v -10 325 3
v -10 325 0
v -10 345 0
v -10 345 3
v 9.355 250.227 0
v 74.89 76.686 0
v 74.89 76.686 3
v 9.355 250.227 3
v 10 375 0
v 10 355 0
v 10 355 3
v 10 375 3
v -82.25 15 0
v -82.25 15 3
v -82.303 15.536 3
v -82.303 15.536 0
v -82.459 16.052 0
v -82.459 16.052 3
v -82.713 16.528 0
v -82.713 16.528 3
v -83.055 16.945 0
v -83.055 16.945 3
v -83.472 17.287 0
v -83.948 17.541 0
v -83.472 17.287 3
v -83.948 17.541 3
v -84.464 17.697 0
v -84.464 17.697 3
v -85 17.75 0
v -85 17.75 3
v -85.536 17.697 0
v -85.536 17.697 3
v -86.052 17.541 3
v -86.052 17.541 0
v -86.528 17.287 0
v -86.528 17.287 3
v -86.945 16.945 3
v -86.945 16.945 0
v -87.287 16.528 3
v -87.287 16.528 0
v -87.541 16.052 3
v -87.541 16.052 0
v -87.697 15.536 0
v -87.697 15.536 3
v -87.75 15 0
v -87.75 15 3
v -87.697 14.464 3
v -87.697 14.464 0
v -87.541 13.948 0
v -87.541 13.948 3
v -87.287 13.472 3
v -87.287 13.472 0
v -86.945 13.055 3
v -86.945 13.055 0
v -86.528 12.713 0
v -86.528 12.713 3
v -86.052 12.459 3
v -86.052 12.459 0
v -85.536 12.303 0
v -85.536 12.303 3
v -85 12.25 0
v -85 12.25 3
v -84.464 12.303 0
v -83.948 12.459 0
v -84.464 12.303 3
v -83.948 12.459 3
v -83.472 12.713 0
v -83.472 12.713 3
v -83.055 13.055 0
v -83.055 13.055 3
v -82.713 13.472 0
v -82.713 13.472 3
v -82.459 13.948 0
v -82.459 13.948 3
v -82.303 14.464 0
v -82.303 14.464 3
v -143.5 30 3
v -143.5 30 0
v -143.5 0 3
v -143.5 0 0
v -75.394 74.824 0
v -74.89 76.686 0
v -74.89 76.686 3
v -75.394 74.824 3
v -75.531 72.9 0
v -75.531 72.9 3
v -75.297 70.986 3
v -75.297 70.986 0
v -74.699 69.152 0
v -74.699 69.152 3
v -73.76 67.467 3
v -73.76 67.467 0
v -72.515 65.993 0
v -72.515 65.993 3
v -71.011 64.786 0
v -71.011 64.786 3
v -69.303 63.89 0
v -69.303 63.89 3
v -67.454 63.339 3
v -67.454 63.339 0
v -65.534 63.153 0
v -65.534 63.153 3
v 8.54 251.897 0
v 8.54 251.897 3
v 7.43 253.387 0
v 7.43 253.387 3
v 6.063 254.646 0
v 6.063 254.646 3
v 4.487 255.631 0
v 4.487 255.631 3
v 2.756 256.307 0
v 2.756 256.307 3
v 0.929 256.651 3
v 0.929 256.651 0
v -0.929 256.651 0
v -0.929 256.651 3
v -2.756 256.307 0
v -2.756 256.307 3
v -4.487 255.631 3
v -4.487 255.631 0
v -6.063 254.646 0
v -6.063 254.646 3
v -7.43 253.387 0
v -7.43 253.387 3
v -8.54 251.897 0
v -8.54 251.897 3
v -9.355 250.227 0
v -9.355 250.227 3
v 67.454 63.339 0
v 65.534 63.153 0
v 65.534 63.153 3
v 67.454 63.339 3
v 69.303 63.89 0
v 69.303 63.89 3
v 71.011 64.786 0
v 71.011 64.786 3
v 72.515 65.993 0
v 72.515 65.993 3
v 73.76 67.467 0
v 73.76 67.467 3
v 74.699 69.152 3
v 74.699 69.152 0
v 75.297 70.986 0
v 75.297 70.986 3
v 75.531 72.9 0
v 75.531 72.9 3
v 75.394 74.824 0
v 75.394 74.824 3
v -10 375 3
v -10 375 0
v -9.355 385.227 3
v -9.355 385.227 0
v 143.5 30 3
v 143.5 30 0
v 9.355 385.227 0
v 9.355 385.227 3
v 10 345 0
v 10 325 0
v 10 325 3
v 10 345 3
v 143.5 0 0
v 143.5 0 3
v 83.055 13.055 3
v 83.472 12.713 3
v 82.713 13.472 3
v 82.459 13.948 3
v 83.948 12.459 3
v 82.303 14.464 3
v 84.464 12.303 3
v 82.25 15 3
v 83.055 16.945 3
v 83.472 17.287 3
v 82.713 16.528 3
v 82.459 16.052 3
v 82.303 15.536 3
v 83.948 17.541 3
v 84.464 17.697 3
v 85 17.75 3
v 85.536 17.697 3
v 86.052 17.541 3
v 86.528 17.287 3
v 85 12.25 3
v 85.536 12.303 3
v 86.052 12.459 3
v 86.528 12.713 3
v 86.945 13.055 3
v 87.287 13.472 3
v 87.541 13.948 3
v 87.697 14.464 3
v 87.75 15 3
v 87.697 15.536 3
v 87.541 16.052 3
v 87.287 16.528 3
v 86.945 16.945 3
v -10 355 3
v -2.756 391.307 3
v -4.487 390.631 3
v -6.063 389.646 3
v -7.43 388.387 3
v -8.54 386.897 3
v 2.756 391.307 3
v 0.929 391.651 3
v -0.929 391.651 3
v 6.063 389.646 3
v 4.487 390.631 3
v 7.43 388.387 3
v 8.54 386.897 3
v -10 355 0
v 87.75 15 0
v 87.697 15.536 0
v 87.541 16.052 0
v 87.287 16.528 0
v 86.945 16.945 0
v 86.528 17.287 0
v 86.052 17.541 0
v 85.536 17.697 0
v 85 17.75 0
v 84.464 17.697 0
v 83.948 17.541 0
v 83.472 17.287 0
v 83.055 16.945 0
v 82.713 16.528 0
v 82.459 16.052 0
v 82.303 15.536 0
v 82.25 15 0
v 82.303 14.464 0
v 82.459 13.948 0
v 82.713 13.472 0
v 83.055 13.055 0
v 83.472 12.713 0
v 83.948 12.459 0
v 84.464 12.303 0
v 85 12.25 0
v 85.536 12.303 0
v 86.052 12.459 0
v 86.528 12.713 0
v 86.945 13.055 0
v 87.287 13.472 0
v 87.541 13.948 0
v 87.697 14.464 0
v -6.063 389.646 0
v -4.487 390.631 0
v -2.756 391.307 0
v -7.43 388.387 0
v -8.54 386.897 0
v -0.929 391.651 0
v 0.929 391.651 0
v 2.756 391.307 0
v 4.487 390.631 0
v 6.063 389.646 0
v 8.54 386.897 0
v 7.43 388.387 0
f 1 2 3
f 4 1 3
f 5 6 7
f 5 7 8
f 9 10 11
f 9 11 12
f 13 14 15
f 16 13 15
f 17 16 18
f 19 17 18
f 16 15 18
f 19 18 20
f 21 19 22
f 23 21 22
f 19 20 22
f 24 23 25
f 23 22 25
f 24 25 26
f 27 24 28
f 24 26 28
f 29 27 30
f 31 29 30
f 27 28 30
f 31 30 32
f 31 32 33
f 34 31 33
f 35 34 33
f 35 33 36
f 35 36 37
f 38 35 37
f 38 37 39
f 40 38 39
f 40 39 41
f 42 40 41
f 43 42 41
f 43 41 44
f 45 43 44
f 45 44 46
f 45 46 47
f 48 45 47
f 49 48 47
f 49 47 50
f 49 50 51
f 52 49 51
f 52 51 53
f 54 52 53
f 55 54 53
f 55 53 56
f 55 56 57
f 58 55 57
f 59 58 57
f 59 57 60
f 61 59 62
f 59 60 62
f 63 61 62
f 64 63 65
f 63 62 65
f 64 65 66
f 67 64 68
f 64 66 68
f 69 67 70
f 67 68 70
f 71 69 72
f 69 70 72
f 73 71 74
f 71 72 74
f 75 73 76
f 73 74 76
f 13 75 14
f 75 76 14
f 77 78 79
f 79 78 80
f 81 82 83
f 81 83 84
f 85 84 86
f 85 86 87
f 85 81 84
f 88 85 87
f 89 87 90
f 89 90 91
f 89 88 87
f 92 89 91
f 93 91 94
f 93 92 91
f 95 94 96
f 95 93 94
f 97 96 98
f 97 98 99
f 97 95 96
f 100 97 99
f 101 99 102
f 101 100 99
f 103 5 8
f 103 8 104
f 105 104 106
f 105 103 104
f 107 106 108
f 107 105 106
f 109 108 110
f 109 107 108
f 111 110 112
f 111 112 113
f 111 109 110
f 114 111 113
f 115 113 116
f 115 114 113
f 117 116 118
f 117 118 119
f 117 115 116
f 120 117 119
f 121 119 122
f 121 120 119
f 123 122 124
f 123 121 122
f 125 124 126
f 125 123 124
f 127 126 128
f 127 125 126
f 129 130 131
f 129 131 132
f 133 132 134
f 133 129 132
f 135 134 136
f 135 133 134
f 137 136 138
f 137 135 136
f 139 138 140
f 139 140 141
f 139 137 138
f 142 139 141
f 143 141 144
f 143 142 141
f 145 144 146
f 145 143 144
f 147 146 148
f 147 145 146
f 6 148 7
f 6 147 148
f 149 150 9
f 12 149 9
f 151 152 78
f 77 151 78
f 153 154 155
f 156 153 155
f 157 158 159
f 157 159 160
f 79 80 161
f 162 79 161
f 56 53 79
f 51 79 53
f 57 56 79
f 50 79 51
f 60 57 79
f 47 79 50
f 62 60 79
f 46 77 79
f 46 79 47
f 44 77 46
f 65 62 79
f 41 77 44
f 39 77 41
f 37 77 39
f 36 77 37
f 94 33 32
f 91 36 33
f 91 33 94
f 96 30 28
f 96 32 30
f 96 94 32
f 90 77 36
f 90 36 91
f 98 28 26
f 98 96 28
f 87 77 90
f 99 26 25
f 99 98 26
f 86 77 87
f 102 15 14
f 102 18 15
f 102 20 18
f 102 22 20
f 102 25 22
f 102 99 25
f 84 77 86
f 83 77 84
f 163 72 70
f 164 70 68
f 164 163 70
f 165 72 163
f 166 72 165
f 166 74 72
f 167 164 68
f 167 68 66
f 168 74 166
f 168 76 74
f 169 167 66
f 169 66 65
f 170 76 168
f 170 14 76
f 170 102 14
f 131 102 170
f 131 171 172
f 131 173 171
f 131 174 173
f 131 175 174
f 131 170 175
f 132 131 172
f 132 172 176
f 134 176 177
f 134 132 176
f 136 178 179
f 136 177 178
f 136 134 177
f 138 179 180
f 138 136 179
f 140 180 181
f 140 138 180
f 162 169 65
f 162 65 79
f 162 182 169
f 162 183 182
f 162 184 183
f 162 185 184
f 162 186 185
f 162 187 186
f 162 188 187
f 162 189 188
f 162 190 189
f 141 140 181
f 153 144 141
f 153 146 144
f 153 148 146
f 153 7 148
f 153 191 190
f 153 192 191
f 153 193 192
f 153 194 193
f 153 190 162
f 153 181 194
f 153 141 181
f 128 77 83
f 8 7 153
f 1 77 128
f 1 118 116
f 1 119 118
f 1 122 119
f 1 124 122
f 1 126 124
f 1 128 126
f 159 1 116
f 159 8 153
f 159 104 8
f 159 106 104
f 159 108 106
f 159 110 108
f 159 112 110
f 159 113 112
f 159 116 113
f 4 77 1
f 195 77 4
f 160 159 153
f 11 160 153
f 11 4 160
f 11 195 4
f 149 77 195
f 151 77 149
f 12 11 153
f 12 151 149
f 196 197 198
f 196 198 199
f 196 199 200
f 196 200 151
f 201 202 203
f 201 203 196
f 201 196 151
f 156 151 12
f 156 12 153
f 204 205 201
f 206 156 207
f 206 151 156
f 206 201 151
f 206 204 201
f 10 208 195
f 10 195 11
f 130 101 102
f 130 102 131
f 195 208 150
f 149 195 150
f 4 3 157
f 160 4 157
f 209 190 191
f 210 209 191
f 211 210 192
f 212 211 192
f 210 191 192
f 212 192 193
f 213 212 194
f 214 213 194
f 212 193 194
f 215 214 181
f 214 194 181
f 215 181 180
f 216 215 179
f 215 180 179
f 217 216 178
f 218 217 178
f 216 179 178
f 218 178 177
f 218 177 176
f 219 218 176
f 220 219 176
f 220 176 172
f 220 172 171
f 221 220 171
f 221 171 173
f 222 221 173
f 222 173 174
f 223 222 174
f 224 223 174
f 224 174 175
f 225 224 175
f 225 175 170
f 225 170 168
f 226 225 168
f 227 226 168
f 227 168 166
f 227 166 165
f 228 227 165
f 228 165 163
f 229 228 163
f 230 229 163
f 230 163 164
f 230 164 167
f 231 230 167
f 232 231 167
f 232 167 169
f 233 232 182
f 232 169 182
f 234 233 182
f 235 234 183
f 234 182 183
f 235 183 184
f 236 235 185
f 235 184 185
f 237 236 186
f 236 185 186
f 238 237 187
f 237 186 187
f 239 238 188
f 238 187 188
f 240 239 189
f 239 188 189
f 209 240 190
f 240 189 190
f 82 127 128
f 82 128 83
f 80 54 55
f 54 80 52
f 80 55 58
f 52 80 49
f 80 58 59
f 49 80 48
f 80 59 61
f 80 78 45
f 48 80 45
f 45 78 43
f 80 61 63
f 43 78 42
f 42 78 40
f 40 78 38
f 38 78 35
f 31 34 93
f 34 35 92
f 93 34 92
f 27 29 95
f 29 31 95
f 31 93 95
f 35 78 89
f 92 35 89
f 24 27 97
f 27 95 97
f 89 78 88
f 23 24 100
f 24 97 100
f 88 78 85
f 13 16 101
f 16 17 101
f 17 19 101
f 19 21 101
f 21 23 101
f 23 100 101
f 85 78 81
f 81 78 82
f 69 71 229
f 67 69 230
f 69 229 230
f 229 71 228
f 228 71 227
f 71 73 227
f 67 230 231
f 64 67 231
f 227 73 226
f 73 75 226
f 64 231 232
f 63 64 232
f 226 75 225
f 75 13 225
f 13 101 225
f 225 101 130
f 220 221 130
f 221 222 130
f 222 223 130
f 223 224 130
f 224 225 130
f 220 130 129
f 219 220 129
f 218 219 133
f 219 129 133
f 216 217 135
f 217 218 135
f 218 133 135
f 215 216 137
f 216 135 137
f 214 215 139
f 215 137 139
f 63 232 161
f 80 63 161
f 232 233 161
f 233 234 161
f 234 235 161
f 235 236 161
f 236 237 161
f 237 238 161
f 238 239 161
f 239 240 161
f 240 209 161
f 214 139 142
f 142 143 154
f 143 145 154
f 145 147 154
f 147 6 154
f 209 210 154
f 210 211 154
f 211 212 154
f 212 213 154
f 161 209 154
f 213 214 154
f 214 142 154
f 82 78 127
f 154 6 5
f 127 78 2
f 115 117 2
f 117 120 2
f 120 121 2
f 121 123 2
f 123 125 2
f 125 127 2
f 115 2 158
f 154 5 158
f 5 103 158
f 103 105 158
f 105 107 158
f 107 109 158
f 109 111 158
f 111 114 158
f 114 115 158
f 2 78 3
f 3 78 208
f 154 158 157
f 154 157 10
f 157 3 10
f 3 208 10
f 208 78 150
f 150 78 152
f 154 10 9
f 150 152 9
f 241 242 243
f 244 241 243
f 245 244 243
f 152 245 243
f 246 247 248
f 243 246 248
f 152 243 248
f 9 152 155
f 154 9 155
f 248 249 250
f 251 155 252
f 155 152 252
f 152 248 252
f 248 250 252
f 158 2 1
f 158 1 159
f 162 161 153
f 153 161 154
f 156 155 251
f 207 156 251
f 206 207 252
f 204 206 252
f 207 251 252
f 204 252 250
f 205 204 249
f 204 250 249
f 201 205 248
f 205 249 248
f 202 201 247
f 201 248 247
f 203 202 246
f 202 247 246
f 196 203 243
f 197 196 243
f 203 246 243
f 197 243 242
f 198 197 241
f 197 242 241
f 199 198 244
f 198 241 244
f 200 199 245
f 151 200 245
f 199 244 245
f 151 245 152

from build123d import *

# Parameters (mm, degrees)
CROQUIS1_W                   = 20
CROQUIS1_H                   = 20
SALIENTE_EXTRUIR1_DEPTH      = 3
TALADRO_DE_MARGEN_PARA_M52_D = 5.5
CORTAR_EXTRUIR1_DEPTH        = 3


with BuildPart() as part:
    # Croquis1 → Saliente-Extruir1 (new body)
    with BuildSketch(Plane.XY):
        with BuildLine():
            Line((-143.5, 0), (143.5, 0))
            Line((143.5, 0), (143.5, 30))
            Line((143.5, 30), (9.355173022, 385.226719524))
            ThreePointArc((9.355173022, 385.226719524), (0, 391.693910765), (-9.355173022, 385.226719524))
            Line((-9.355173022, 385.226719524), (-143.5, 30))
            Line((-143.5, 30), (-143.5, 0))
        make_face()
        with Locations((0, 365)):
            Rectangle(CROQUIS1_W, CROQUIS1_H, mode=Mode.SUBTRACT)
        with Locations((0, 335)):
            Rectangle(CROQUIS1_W, CROQUIS1_H, mode=Mode.SUBTRACT)
    extrude(amount=SALIENTE_EXTRUIR1_DEPTH)

    # Taladro de margen para M52 (through all)
    with Locations(Plane(origin=(0, 0, 0), x_dir=(-1, 0, 0), z_dir=(0, 0, -1))):
        with Locations((-85, 15), (85, 15)):
            Hole(TALADRO_DE_MARGEN_PARA_M52_D / 2)

    # Croquis4 → Cortar-Extruir1 (cut)
    with BuildSketch(Plane(origin=(0, 0, 0), x_dir=(-1, 0, 0), z_dir=(0, 0, -1))):
        with BuildLine():
            Line((9.355173022, 250.226719524), (74.889584061, 76.686118864))
            ThreePointArc((74.889584061, 76.686118864), (73.760226731, 67.466838773), (65.534411039, 63.153310105))
            Line((65.534411039, 63.153310105), (-65.534411039, 63.153310105))
            ThreePointArc((-65.534411039, 63.153310105), (-73.760226731, 67.466838773), (-74.889584061, 76.686118864))
            Line((-74.889584061, 76.686118864), (-9.355173022, 250.226719524))
            ThreePointArc((-9.355173022, 250.226719524), (0, 256.693910765), (9.355173022, 250.226719524))
        make_face()
    extrude(amount=-CORTAR_EXTRUIR1_DEPTH, mode=Mode.SUBTRACT)


solid = part.part
